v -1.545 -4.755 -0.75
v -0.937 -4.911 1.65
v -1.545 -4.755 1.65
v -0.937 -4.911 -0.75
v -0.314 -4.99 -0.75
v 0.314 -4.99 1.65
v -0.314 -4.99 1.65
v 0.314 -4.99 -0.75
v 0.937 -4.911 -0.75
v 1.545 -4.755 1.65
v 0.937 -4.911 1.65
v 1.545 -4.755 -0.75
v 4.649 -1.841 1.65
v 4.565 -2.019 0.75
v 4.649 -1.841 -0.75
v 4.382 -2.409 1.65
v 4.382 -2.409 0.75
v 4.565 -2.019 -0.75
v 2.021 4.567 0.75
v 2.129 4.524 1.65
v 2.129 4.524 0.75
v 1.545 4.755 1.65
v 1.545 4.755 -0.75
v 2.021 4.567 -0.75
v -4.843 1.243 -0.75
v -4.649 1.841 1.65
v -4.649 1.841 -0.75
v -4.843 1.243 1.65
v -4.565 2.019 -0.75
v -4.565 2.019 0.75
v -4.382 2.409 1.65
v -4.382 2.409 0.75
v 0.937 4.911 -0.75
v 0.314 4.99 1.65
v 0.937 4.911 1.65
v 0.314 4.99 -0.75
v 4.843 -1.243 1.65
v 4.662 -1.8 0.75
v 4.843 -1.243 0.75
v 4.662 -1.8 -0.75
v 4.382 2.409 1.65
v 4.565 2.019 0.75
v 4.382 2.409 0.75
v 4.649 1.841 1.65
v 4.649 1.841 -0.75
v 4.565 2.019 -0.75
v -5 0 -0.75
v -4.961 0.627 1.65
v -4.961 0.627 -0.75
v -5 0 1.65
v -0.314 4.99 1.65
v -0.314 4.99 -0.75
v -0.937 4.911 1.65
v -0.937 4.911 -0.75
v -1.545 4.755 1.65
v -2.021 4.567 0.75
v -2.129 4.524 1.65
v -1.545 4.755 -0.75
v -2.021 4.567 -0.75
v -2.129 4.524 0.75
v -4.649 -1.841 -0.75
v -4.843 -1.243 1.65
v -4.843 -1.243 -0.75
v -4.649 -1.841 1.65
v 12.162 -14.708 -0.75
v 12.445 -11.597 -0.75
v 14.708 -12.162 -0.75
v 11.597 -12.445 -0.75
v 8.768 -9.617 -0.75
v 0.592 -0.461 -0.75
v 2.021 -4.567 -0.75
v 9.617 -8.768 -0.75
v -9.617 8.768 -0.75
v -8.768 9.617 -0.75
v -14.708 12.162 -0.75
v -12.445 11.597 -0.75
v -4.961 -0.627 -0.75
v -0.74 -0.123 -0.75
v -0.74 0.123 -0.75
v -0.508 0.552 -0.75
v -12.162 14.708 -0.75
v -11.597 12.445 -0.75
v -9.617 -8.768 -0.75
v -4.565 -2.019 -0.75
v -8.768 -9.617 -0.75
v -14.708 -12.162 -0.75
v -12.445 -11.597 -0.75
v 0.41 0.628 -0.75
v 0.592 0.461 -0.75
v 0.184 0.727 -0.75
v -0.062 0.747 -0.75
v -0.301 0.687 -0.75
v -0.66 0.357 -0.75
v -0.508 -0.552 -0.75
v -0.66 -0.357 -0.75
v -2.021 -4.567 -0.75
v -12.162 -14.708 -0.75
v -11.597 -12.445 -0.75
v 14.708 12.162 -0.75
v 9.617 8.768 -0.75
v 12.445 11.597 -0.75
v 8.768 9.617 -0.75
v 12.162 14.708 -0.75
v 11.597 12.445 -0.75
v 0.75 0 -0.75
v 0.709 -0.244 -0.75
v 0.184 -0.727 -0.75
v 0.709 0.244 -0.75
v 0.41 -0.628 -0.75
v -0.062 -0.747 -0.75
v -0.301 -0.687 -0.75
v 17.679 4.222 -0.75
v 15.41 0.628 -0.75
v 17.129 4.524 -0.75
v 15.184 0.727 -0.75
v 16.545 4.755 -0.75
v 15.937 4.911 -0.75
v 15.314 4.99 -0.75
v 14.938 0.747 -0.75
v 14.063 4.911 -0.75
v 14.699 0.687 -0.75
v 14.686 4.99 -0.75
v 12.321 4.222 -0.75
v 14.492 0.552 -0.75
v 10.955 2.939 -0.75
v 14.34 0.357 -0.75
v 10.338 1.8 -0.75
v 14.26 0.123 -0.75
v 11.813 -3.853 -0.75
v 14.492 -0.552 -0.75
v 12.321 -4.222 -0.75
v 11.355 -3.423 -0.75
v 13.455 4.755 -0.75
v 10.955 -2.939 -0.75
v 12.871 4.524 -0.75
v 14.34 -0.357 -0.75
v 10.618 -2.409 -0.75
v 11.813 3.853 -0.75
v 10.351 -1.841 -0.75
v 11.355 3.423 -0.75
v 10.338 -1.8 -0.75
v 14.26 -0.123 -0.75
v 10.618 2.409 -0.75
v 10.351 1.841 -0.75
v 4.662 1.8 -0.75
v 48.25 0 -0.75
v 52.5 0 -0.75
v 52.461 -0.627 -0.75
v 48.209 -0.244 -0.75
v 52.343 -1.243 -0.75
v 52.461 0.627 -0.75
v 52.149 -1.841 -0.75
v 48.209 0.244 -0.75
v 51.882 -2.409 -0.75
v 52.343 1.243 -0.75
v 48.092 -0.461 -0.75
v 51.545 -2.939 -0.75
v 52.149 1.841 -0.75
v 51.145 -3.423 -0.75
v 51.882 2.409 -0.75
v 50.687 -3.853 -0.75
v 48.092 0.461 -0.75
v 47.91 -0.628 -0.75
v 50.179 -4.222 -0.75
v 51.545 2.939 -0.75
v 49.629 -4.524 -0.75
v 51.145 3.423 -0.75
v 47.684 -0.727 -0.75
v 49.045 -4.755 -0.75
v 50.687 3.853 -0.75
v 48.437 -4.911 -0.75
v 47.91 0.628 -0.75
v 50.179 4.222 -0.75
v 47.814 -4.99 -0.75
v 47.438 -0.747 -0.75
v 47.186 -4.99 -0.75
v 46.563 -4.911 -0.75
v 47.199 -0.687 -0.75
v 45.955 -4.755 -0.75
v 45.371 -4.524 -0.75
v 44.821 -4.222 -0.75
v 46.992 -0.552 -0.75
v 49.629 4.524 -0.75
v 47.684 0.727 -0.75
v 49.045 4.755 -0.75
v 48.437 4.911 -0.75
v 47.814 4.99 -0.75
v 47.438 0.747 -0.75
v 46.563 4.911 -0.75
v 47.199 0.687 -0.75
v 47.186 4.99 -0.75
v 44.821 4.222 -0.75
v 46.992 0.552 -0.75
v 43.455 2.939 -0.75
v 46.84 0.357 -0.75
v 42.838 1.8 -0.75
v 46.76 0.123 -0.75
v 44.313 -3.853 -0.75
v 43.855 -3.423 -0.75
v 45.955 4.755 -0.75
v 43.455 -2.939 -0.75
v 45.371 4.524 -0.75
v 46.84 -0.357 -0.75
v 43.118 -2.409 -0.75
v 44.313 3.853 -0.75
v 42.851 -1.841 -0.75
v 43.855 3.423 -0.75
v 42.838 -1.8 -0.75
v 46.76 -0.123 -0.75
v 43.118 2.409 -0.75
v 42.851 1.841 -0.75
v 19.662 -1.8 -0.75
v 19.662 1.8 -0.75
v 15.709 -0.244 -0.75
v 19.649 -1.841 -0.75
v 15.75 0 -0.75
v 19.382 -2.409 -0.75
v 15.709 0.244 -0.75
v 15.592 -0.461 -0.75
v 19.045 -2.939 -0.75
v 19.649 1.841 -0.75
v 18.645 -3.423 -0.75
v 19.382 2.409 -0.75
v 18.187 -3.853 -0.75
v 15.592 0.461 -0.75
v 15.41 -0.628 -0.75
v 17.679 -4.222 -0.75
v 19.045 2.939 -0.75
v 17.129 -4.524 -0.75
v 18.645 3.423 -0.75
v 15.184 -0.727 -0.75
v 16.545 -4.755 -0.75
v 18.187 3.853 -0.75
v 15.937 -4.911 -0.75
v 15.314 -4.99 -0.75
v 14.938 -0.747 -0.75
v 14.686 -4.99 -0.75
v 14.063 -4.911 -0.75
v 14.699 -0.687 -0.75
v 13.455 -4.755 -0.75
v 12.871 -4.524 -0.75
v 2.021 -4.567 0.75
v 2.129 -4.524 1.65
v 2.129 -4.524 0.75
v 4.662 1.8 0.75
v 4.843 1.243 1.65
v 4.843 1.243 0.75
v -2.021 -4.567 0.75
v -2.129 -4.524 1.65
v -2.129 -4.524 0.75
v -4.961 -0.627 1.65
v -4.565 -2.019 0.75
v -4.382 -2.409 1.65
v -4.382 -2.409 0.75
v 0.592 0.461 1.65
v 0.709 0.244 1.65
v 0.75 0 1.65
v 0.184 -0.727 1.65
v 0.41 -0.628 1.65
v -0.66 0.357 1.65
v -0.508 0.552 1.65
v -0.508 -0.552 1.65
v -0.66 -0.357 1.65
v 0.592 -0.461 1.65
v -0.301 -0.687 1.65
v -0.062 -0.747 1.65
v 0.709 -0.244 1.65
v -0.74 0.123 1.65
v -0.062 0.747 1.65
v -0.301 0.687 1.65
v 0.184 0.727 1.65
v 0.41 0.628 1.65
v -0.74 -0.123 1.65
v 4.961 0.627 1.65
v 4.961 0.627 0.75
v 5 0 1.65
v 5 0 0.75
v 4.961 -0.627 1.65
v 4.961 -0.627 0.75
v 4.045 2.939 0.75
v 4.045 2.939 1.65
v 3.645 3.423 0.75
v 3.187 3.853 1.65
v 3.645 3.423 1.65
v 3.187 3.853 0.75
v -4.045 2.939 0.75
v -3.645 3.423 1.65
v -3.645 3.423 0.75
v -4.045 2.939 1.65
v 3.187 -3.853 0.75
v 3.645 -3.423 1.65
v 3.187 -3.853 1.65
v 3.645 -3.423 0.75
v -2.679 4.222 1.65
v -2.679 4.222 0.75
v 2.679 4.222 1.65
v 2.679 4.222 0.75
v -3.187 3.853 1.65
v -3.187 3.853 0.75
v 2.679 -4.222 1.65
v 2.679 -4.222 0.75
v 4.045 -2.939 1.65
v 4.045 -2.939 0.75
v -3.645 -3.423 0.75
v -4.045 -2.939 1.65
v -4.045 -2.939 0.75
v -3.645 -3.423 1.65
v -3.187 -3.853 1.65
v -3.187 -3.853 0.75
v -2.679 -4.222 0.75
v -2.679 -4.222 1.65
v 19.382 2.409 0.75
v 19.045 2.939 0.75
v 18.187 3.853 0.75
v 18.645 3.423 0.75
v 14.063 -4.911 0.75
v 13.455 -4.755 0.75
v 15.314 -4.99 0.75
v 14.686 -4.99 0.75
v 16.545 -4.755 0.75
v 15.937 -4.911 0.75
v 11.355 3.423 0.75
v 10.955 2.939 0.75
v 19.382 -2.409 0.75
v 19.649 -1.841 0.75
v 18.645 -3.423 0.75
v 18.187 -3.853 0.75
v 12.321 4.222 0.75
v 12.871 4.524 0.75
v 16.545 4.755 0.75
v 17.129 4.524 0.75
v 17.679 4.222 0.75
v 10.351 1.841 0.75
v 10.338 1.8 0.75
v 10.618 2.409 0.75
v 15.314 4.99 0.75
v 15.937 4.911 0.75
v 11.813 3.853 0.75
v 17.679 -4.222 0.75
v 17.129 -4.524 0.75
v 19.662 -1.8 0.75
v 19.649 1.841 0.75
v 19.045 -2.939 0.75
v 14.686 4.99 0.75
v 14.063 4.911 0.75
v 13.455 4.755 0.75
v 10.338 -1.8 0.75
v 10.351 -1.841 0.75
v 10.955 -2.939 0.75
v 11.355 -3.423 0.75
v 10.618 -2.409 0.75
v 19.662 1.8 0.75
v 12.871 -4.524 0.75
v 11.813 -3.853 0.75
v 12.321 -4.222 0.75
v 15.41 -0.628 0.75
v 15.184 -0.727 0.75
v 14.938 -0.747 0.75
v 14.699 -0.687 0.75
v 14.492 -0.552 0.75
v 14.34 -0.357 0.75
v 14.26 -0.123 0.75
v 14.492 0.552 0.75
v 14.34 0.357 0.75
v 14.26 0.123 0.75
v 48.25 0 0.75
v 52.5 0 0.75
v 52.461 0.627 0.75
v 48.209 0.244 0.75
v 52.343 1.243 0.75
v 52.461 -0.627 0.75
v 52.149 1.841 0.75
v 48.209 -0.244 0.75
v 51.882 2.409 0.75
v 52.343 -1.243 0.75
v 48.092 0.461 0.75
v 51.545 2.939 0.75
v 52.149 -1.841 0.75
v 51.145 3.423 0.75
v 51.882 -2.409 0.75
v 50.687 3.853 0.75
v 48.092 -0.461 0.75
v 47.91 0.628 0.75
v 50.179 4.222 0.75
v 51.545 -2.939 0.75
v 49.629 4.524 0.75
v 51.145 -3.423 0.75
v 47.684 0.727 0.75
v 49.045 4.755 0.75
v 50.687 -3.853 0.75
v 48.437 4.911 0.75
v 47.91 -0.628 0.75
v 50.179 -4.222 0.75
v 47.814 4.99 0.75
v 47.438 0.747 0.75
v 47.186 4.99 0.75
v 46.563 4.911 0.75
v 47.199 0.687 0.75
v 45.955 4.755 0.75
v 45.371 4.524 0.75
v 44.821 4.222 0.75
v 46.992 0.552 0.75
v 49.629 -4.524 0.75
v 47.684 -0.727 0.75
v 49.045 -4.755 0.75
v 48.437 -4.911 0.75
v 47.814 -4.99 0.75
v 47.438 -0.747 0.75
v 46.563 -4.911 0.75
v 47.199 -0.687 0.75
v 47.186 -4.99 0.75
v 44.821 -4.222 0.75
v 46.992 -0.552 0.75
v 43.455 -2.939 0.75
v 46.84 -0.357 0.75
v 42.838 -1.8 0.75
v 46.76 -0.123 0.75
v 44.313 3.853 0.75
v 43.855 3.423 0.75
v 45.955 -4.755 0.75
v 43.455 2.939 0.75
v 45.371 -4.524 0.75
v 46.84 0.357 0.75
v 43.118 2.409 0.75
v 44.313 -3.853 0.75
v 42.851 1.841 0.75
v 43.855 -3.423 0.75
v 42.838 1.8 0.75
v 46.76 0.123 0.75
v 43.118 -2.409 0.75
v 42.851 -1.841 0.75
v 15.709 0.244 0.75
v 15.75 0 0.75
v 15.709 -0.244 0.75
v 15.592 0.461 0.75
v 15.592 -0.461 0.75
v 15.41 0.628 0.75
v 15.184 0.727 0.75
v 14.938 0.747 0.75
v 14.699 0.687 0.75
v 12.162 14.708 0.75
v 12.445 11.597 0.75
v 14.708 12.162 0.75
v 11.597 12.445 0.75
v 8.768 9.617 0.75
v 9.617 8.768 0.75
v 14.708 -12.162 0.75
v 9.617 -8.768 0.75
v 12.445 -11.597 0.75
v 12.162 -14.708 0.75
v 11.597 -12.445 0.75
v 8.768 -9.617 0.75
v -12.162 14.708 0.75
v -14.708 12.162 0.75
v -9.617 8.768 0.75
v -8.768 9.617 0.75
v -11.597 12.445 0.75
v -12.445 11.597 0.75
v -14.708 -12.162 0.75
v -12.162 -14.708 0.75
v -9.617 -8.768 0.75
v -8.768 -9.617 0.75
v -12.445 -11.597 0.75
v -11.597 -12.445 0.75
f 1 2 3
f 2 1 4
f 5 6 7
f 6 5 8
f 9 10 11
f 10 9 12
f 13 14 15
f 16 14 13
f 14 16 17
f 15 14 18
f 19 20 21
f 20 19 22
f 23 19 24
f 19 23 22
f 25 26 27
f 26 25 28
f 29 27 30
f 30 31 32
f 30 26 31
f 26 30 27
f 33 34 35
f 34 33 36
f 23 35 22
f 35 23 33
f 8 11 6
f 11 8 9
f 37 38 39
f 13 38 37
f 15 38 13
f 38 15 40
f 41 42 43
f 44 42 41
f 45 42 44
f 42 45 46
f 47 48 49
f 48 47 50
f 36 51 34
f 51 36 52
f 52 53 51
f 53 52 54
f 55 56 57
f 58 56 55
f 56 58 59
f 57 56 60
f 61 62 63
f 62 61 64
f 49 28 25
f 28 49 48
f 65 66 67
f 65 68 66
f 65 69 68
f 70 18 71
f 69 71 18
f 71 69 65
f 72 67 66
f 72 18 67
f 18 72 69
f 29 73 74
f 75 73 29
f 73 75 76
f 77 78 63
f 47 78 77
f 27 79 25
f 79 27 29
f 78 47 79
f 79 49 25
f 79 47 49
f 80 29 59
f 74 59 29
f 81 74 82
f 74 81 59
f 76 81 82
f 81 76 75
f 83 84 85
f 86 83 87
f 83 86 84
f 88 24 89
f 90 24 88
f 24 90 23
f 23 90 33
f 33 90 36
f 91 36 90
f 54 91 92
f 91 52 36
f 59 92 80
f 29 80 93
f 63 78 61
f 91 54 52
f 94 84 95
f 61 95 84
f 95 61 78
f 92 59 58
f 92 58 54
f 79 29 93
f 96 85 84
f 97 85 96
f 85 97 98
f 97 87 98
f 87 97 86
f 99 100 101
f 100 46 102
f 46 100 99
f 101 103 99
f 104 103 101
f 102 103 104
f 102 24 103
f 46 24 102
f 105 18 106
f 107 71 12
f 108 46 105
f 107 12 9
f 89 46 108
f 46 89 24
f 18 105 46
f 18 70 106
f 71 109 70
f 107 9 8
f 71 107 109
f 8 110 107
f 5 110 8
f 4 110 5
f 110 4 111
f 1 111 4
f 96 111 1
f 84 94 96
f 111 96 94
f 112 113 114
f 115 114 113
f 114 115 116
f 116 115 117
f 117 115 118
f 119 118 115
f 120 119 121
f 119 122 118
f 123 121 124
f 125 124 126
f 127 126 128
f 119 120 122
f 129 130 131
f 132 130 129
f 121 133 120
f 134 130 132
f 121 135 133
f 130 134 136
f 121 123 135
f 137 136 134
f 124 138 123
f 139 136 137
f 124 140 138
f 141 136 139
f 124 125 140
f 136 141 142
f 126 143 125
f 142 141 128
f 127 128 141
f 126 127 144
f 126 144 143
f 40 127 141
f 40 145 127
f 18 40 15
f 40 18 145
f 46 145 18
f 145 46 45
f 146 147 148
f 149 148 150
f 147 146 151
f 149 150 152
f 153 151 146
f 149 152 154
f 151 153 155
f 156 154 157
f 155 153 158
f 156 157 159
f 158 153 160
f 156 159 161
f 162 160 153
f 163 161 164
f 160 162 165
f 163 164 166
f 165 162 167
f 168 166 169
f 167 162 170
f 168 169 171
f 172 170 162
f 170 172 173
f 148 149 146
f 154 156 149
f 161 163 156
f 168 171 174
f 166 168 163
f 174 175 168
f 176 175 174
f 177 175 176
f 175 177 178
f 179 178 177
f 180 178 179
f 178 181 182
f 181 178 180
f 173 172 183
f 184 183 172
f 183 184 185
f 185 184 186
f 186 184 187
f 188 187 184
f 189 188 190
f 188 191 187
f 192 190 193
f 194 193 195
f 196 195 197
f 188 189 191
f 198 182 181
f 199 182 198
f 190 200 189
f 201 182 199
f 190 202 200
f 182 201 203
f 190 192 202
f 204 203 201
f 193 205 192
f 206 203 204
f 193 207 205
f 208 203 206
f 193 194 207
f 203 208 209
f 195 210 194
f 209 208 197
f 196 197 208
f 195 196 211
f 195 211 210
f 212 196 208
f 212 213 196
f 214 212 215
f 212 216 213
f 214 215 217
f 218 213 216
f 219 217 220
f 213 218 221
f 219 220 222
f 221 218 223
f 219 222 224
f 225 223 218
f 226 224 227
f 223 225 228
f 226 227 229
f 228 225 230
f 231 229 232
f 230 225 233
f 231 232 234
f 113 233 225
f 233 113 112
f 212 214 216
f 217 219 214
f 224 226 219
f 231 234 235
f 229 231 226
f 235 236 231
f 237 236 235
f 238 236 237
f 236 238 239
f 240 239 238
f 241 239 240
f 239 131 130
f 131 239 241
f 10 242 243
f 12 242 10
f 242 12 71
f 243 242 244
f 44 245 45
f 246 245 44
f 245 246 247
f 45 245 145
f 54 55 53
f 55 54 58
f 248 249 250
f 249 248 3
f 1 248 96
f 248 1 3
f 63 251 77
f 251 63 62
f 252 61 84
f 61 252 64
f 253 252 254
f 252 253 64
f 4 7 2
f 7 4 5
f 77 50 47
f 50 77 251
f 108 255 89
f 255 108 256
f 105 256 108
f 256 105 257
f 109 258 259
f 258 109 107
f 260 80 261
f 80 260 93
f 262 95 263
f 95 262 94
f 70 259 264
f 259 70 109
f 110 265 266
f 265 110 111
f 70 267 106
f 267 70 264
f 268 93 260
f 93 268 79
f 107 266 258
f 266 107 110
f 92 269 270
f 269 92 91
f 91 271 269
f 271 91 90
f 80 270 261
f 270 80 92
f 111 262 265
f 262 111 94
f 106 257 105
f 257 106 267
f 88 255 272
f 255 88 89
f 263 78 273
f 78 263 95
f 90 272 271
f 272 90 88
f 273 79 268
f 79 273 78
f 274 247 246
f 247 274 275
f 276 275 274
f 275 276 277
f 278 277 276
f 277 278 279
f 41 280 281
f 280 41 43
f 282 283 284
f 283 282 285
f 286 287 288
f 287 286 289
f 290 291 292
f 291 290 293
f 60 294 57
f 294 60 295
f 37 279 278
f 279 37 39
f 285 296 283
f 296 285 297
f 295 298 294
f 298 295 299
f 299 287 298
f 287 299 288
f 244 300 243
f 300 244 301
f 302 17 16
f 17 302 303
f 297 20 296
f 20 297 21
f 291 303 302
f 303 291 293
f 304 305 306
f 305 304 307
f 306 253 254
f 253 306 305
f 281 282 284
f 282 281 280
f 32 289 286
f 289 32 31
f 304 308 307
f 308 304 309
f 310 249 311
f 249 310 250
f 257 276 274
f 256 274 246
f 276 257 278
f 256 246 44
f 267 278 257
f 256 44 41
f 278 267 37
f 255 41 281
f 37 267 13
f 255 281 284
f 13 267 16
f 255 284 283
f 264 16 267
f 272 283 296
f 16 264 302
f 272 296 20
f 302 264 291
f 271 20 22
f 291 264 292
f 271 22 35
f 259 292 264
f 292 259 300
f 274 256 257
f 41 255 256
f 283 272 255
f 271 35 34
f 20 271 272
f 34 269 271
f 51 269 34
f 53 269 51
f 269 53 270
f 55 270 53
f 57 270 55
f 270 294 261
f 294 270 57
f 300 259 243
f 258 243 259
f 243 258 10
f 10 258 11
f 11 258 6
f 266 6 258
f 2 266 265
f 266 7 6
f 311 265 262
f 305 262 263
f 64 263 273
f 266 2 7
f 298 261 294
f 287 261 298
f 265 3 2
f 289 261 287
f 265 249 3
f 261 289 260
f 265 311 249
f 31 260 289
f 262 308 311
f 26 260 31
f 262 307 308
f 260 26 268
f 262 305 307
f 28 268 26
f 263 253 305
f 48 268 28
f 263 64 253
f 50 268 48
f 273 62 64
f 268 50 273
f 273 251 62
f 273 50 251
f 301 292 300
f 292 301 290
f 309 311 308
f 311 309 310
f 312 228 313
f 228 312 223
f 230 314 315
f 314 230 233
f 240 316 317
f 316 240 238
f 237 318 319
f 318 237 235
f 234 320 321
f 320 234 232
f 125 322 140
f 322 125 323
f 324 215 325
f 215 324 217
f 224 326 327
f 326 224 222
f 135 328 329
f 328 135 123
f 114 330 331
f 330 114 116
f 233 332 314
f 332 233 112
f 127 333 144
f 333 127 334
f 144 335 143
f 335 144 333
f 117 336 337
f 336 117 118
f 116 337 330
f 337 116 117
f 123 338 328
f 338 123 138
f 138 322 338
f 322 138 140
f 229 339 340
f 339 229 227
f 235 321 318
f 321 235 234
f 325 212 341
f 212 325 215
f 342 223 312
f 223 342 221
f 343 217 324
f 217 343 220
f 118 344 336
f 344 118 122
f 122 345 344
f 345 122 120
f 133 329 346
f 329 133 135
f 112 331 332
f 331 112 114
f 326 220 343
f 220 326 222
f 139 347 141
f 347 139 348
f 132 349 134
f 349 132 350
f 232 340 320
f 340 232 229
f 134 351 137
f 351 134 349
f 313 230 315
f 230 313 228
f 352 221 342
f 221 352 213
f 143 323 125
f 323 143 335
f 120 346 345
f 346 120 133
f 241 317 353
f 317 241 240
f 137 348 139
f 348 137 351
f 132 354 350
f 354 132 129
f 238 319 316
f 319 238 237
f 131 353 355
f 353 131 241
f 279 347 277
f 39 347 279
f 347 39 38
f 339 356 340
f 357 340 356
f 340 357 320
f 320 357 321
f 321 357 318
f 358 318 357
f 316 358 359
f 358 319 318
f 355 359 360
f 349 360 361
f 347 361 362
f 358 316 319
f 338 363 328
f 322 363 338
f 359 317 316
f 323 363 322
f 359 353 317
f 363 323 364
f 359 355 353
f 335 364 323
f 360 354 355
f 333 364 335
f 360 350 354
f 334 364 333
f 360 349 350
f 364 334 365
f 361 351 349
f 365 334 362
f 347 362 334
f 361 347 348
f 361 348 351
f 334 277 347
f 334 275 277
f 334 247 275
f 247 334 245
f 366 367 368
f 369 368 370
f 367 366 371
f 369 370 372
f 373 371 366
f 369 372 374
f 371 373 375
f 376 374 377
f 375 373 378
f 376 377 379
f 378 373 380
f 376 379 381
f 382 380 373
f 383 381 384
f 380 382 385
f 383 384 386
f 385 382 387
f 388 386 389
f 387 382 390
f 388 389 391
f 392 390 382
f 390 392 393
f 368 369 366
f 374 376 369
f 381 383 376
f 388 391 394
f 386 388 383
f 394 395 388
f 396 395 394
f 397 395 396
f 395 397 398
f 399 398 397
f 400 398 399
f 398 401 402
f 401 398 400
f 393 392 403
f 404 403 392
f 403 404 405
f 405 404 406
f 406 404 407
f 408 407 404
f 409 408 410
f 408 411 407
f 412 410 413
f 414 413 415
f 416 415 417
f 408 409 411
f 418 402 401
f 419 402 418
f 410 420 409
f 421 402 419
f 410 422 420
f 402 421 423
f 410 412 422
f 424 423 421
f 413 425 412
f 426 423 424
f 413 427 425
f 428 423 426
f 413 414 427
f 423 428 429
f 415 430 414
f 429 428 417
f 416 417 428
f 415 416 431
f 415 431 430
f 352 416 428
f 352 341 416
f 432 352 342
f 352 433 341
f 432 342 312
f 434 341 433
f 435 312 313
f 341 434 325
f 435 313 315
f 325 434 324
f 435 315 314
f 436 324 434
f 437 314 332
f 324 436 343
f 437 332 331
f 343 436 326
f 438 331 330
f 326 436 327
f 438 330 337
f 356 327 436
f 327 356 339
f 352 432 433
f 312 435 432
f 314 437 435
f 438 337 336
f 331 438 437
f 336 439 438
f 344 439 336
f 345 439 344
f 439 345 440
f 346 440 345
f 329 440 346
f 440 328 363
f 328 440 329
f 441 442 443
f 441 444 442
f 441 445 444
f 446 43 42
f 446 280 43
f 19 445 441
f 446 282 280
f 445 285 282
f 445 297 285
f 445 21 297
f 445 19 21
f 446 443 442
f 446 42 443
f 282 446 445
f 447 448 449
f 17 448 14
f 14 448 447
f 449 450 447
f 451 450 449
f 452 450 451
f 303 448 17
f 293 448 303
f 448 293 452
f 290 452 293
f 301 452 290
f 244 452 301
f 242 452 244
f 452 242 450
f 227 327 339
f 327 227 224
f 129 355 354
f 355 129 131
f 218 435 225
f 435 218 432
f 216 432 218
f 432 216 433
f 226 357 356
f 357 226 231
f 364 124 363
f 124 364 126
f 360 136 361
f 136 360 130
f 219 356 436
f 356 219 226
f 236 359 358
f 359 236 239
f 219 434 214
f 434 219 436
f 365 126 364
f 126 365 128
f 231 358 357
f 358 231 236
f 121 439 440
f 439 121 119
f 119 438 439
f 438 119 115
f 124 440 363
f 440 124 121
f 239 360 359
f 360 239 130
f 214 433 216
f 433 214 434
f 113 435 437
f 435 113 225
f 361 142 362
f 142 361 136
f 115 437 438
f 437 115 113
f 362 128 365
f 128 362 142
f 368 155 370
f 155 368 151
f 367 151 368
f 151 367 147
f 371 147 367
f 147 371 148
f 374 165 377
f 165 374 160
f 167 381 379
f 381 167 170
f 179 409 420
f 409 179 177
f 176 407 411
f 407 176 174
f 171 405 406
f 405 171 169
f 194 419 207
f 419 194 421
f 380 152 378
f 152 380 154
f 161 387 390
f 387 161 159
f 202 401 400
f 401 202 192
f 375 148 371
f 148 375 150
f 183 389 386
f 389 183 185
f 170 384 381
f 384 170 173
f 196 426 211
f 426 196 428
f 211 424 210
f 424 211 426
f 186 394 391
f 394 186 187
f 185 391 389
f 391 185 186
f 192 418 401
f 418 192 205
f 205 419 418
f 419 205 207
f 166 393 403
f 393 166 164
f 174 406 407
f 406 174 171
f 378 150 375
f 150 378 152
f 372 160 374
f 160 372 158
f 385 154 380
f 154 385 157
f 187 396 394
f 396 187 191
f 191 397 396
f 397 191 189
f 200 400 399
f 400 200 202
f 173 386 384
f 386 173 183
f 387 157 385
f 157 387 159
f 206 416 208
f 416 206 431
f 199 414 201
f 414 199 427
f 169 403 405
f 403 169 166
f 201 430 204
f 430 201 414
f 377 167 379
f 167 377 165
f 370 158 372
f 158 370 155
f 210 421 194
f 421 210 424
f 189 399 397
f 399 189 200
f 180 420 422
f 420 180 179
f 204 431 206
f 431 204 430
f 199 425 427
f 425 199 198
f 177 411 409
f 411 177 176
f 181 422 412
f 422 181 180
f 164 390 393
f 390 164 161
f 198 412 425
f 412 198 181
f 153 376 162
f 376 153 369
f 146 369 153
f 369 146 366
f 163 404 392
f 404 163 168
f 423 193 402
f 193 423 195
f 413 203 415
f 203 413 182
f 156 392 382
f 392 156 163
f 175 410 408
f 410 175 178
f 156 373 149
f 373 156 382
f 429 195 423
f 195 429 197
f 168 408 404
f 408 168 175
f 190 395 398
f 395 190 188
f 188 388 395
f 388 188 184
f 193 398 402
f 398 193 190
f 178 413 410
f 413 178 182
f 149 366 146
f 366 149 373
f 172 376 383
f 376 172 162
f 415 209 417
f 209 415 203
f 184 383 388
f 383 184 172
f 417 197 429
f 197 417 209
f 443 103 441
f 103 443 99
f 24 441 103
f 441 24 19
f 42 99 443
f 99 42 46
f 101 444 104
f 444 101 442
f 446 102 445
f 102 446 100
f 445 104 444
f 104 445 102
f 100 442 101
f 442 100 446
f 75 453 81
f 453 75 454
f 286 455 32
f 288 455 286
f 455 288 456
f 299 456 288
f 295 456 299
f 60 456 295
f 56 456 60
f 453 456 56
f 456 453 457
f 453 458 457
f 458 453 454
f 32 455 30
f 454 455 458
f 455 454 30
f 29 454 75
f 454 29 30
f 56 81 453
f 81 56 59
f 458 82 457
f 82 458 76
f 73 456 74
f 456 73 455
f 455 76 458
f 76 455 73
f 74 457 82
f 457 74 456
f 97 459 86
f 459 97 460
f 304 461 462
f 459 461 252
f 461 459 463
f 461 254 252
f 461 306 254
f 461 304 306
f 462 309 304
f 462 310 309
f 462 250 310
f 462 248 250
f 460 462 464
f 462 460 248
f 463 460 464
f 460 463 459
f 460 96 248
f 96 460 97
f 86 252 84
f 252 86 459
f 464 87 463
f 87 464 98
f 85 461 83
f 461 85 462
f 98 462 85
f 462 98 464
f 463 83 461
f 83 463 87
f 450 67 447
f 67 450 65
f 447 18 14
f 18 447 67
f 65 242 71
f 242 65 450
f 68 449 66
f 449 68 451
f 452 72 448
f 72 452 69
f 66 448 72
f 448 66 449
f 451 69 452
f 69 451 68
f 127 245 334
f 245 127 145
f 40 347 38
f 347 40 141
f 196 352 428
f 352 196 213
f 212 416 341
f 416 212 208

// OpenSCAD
// file: bcstr.scad
// bcstr.scad generic helper modules (2026-05-12)
// comments after modules show up in vscode tooltips
module b(x,y,z){           cube([x,y,z],center=true); }     // block (cube)
module c(hi,od){ $fn=16*sqrt(od); cylinder(h=hi, d=od, center=true); } // cylinder
module s(diameter){        sphere(d=diameter); }            // sphere
module t(x,y,z){           translate([x,y,z]) children(); } // translate
module r(ax,ay,az){        rotate([ax,ay,az]) children(); } // rotate

// rotating around one axis by 90 degrees is very common
module rx(a=90){ rotate([a,0,0]) children(); }
module ry(a=90){ rotate([0,a,0]) children(); }
module rz(a=90){ rotate([0,0,a]) children(); }

// cylinder in the direction of X,Y,Z axis
X=1111; Y=1112; Z=1113; // dir
module cyl(dir, l=40, d=3){ //ex: cyl(Y,4,20);
    if(dir==X){
        r(0,90,0) c(l,d);
    }else if(dir==Y){
        r(90,0,0) c(l,d);
    }else if(dir==Z){
        c(l,d);
    }
}


// capped or regular pipe
// cap parameter is the thickness of a cap
module pipe(len, od, id, cap=0){
    inLen = cap ? len-2*cap : len+2;
    difference(){
        c(len, od);
        c(inLen, id);
    }
}


// capped or regular square pipe (tube)
// wall parameter is wall thickness
// cap parameter is the thickness of a cap
module sq_pipe(length, width, height, wall, cap=0){
    h = cap ? height-2*cap : height+2;
    difference(){
        b(length, width, height);
        b(length-2*wall, width-2*wall, h);
    }
}


// this allows you to make C-channels and open boxes
// parameters are the same as for sq_pipe()
module open_sqp(length, width, height, wall, cap=0){
    dt = 0.02; // overlaps for the cutout
    difference() { // opens one wall
        sq_pipe(length, width, height, wall, cap);
        t(0,(width-wall)/2,0) b(length-2*wall,wall+dt,dt+height-2*cap);
    }
}


// tests
color("red") s(100);
c(100,50);
b(100,100,50);
color("grey") t(100,0,0)  pipe(50,20,10);
t(0,-100,0) sq_pipe(40,20,50,3);
color("orange") t(0,100,0) open_sqp(40,20,50,3);
t(0,150,0) open_sqp(40,20,50,3,3);

// show how cylinders look with "progressive" $fn
t(100,100,0) c(20,0.3);
t(100,105,0) c(20,0.5);
t(100,110,0) c(20,1);
t(100,115,0) c(20,3);
t(100,120,0) c(20,5);
t(100,130,0) c(20,10);
t(100,150,0) c(20,25);

intersection(){ // capped pipe demo
    t(-100,0,0) pipe(50,20,10,1);
    t(-90,0,0) b(22,22,60); // slice the pipe to show caps
}



module d(){ // alternative to difference()
    difference(){
        children(0); 
        for(i=[1:$children-1]) children(i);
    }
}
module i(){ // alternative to intersection()
    intersection(){
        children(0); 
        for(i=[1:$children-1]) children(i);
    }
}
module u(){ children(); } // alternative to union()

// testing d() i() u()
t(0,0,100) i(){
    t(0,5,0) b(10,10,30);
    d(){
        u(){
            b(10,12,15);
            t(0,0,10) s(10);
        }
        c(30, 5);
    }
}
// main file
// This is a drawing tool for drawing circles
// for making disk brakes out of 0.5mm sheet metal
//
// 3D print the drawing tool using 0.3mm layers
// insert thumb tacs/push pins into the raised tool center and end
// my thumb tacs have 1.1mm to 1.2mm shaft diameter
// punch a sheet of metal with a center punch
// center one pin over the center punch mark and draw a circle with the other
//
// move the end tack into the closer hole
// draw a 15mm circle for marking screw holes
// scratch 4 marks in the slots to mark screw hole positions
//
// cut the disk out with metal scissors
// drill a 10mm or a 3/8" diameter hole in the center
// center punch and drill 4 screw holes
//
use <bcstr.scad>
$fn = 256;
l = 0.3;  // layer
h = l*5;  // circle and bar height
p = l*5;  // pin hole size
w = l*12; // bar width
d = 95/2; // disk brakes are 95mm in diameter (matches an HD platelet size)
c = 10;   // fits into 10mm center hole in the disk (in case you drilled before marking)

module tachole(){
    difference(){
        c(h,c);
        c(2*h, p); // hole for a pin
    }
}

module arm(){
    t(9,0,0) difference(){
        b(16, w, h);
        t(4,0,0) b(4, p-0.3, h+1); // slots are thinner than pin holes
    }
}

module disk_tool(){
    tachole();            // center
    t(0,0,0.9) tachole(); // raised so it can be put inside a disk center hole
    t(15,0,0)  tachole(); // for marking mounting holes
    t(d,0,0)   tachole(); // for marking outer circumference
    color("red")   t(8,0,0)  b(8,w,h);  // connector
    color("green") t(32,0,0) b(26,w,h); // connector
    for(a=[45:90:315]){
        color("yellow") r(0,0,a) t(2,0,0) arm();
    }
}

disk_tool();
